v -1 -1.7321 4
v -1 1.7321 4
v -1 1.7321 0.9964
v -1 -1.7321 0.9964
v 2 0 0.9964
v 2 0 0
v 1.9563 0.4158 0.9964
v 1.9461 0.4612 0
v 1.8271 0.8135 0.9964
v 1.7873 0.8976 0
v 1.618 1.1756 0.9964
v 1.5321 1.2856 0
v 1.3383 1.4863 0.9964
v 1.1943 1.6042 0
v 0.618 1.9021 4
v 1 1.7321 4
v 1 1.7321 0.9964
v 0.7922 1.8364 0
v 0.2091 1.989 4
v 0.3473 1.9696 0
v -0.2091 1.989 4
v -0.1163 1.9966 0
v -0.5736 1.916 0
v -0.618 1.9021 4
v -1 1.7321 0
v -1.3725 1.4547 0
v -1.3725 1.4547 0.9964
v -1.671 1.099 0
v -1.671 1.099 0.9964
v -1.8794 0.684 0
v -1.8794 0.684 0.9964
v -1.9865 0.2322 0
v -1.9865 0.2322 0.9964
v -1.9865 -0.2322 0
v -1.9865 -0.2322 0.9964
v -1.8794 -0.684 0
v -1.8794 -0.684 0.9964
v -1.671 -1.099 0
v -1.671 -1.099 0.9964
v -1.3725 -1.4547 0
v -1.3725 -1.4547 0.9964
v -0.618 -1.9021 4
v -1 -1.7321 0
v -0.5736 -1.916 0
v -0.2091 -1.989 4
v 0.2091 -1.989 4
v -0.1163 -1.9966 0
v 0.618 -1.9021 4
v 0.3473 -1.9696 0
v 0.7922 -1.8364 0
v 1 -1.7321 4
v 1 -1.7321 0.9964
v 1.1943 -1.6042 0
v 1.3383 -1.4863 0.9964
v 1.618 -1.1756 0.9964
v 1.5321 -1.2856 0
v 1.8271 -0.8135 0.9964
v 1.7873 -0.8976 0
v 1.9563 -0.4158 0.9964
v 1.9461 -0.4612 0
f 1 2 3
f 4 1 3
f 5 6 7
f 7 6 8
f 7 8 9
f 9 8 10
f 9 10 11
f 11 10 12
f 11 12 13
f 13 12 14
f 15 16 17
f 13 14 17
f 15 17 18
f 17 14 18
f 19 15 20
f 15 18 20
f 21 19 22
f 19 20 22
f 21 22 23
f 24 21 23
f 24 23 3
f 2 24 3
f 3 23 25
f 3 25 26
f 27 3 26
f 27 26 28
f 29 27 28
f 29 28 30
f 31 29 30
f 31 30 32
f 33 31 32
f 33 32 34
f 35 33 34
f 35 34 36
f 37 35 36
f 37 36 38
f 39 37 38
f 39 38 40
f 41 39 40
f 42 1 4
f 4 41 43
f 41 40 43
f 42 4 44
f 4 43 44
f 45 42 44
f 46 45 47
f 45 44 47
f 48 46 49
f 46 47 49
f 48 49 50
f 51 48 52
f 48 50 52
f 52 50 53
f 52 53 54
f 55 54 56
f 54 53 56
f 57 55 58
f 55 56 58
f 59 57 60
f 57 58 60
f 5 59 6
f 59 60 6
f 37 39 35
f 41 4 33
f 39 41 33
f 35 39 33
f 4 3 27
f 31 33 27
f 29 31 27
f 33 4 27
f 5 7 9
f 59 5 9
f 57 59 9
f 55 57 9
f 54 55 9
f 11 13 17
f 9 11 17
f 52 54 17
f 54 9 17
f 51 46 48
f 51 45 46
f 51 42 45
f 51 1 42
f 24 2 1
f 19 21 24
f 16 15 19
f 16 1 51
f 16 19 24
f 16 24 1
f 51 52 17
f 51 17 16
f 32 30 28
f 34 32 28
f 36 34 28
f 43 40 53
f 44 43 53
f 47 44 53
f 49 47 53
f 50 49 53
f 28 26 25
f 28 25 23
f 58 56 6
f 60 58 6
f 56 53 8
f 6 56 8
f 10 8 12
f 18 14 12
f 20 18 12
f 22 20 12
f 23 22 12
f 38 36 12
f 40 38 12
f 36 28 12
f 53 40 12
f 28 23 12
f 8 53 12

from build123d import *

# Parameters (mm, degrees)
SKETCH1_R           = 2
BOSS_EXTRUDE1_DEPTH = 4
CUT_EXTRUDE2_DEPTH  = 2


with BuildPart() as part:
    # Sketch1 → Boss-Extrude1 (new body)
    with BuildSketch(Plane.XY):
        Circle(SKETCH1_R)
    extrude(amount=BOSS_EXTRUDE1_DEPTH)

    # Sketch2 → Cut-Extrude2 (cut, symmetric)
    with BuildSketch(Plane(origin=(0, 0, 0), x_dir=(1, 0, 0), z_dir=(0, 1, 0))):
        Polygon((-1, -5), (1, -5), (2, -5), (2, -0.996424707), (1, -0.996424707), (1, -3), (1, -4), (-1, -4), (-1, -3), (-1, -0.996424707), (-2, -0.996424707), (-2, -5), align=None)
    extrude(amount=CUT_EXTRUDE2_DEPTH, both=True, mode=Mode.SUBTRACT)


solid = part.part
